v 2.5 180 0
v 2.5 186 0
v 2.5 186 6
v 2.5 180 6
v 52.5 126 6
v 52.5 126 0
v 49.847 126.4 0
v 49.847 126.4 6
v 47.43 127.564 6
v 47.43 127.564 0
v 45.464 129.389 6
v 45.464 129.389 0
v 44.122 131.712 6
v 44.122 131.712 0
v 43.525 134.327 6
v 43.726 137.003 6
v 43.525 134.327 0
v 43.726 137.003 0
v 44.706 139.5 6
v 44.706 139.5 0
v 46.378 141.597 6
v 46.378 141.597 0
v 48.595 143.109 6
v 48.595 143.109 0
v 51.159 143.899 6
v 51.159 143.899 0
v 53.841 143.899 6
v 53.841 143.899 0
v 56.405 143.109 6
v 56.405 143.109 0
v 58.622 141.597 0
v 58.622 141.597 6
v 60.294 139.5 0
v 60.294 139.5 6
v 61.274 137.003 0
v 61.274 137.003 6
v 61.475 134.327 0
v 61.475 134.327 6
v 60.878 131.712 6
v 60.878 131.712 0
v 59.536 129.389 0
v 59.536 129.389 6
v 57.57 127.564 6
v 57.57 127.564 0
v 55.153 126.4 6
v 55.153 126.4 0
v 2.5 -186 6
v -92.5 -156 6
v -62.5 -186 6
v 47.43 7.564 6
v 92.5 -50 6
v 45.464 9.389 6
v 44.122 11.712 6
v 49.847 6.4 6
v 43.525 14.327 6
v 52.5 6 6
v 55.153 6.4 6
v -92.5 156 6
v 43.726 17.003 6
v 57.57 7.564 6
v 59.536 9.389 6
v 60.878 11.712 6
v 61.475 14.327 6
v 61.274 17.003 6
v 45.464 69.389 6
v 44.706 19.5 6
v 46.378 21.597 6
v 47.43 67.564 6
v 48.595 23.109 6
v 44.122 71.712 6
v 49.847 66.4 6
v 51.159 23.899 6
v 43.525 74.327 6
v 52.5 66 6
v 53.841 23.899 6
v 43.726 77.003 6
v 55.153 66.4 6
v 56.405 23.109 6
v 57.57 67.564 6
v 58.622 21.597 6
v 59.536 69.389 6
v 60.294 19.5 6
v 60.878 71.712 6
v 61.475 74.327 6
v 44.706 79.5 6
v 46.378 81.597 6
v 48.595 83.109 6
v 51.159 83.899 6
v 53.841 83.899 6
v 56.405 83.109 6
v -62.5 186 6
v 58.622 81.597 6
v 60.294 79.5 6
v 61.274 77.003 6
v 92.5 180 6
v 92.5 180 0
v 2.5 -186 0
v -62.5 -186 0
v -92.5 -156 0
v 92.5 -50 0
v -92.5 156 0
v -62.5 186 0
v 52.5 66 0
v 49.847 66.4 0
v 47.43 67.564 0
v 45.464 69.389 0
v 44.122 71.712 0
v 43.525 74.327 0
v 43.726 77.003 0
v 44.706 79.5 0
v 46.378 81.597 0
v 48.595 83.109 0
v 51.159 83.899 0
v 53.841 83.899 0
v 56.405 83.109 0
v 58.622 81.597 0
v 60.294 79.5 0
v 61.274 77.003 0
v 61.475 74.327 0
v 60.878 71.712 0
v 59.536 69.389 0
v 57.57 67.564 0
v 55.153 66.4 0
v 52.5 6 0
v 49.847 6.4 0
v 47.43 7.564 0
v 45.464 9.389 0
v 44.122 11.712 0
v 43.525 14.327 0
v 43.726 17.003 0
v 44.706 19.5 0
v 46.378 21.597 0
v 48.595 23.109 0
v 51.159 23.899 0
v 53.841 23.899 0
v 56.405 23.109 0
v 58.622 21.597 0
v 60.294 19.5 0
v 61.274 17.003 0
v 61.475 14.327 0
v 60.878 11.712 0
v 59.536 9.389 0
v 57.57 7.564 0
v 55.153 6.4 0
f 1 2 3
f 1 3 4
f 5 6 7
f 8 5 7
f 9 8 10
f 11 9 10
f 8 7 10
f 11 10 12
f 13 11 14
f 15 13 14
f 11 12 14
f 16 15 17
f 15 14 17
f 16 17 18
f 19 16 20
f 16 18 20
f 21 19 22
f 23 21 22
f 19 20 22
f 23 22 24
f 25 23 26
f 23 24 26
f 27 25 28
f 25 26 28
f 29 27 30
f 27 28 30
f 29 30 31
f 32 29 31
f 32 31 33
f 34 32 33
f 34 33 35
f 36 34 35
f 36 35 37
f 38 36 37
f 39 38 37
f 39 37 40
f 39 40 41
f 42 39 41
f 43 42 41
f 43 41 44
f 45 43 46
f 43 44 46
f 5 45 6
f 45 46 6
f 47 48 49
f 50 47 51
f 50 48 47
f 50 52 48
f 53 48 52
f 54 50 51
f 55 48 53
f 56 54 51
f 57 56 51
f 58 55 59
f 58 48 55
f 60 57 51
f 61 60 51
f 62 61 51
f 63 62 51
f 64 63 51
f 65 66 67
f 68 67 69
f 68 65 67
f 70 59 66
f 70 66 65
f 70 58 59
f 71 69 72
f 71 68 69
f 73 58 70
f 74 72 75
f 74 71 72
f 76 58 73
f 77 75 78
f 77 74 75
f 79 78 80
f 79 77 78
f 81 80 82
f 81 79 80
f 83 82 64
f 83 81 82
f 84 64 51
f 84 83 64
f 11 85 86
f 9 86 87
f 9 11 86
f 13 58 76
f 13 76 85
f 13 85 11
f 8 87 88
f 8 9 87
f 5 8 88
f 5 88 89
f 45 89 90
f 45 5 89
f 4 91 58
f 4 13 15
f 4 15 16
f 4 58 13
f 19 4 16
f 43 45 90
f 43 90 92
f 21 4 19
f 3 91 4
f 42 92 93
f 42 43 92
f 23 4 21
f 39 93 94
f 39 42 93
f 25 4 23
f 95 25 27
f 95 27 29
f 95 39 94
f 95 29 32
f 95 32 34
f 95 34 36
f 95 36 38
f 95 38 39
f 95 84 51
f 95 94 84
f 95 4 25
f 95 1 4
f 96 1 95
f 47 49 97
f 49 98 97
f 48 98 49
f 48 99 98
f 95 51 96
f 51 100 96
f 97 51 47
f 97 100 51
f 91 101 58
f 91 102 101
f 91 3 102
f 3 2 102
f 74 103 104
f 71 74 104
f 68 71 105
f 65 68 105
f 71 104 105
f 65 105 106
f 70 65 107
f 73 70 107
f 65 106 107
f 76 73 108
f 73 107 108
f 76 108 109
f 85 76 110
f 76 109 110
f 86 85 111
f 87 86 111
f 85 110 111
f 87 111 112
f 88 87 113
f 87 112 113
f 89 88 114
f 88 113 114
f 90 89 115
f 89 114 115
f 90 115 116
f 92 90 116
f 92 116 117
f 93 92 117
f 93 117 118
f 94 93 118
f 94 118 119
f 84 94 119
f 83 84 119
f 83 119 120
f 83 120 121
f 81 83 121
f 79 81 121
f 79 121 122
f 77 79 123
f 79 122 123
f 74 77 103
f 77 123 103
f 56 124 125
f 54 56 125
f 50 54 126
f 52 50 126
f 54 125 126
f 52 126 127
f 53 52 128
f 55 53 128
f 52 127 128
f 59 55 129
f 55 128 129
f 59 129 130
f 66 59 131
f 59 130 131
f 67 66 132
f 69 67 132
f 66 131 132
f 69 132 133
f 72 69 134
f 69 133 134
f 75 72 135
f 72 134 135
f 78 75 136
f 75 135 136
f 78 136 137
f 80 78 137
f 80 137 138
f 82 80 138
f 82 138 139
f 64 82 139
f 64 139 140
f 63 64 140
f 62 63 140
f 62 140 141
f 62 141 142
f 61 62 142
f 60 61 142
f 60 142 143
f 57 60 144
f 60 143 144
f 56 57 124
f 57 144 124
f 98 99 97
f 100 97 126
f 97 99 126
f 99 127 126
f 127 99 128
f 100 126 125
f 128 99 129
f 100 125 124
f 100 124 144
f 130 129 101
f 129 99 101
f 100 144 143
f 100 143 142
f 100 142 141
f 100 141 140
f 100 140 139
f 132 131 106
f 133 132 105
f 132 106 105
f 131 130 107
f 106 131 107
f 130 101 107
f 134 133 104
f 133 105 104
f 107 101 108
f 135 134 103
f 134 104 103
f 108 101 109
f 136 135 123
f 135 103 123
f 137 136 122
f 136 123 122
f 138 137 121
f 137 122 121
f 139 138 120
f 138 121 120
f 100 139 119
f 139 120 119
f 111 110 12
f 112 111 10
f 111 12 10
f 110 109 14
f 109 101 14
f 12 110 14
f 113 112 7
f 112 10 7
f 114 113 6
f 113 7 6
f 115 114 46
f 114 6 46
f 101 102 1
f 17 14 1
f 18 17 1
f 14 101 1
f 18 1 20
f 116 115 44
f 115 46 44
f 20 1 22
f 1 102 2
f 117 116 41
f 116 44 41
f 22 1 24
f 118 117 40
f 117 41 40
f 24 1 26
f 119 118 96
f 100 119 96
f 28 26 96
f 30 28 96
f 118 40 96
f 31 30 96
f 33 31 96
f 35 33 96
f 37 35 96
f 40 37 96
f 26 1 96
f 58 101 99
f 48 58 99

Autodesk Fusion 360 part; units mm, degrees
sketch "スケッチ1" plane through (0, 0, 0) normal (0, 0, 1) x (1, 0, 0)
  line L0 (2.5, 186) -> (-92.5, 186)
  line L1 (-92.5, 186) -> (-92.5, -186)
  line L2 (-92.5, -186) -> (2.5, -186)
  line L3 (92.5, -50) -> (92.5, 180)
  line L4 (89.5161, 180) -> (-92.5, -186) construction
  line L5 (-92.5, 186) -> (53.8847, -108.352) construction
  line L6 (2.5, 186) -> (2.5, 180)
  line L7 (2.5, 180) -> (92.5, 180)
  line L8 (-92.5, -186) -> (2.5, -186) construction
  line L9 (92.5, -50) -> (2.5, -186)
  dimension "d2" = 372
  dimension "d5" = 95
extrude "押し出し1" add sketch "スケッチ1" along normal blind 6
chamfer "面取り1" distance 30 angle 45 2 edges at (-92.5, -186, 3) (-92.5, 186, 3)
sketch "スケッチ2" plane through (0, 0, 6) normal (0, 0, 1) x (-1, 0, 0)
  line L0 (62.5, -186) -> (92.5, -156)
  line L1 (92.5, -156) -> (92.5, 156)
  line L2 (92.5, 156) -> (62.5, 186)
  line L3 (62.5, 186) -> (-2.5, 186)
  line L4 (-2.5, 186) -> (-92.5, 50)
  line L5 (-92.5, 50) -> (-92.5, -180)
  line L6 (-92.5, -180) -> (-2.5, -180)
  line L7 (-2.5, -180) -> (-2.5, -186)
  line L8 (-2.5, -186) -> (62.5, -186)
  line L9 (-92.5, -180) -> (-52.5, -180) construction
  line L10 (-52.5, -180) -> (-52.5, -135) construction
  line L11 (-52.5, -135) -> (-92.5, -135) construction
  line L12 (-92.5, -135) -> (-92.5, -180) construction
  line L13 (-52.5, -135) -> (-52.5, -75) construction
  line L14 (-52.5, -75) -> (-52.5, -15) construction
  point P0 (-52.5, -135)
  point P1 (-52.5, -75)
  point P2 (-52.5, -15)
  dimension "d10" = 40
  dimension "d11" = 45
  dimension "d12" = 60
  dimension "d13" = 60
hole "穴1" at (52.5, 135, 6) at (52.5, 75, 6) at (52.5, 15, 6) at (52.5, 15, 6) direction (0, 0, -1) diameter 18 end through all
equation "d5 = 30 mm + 65 mm"
